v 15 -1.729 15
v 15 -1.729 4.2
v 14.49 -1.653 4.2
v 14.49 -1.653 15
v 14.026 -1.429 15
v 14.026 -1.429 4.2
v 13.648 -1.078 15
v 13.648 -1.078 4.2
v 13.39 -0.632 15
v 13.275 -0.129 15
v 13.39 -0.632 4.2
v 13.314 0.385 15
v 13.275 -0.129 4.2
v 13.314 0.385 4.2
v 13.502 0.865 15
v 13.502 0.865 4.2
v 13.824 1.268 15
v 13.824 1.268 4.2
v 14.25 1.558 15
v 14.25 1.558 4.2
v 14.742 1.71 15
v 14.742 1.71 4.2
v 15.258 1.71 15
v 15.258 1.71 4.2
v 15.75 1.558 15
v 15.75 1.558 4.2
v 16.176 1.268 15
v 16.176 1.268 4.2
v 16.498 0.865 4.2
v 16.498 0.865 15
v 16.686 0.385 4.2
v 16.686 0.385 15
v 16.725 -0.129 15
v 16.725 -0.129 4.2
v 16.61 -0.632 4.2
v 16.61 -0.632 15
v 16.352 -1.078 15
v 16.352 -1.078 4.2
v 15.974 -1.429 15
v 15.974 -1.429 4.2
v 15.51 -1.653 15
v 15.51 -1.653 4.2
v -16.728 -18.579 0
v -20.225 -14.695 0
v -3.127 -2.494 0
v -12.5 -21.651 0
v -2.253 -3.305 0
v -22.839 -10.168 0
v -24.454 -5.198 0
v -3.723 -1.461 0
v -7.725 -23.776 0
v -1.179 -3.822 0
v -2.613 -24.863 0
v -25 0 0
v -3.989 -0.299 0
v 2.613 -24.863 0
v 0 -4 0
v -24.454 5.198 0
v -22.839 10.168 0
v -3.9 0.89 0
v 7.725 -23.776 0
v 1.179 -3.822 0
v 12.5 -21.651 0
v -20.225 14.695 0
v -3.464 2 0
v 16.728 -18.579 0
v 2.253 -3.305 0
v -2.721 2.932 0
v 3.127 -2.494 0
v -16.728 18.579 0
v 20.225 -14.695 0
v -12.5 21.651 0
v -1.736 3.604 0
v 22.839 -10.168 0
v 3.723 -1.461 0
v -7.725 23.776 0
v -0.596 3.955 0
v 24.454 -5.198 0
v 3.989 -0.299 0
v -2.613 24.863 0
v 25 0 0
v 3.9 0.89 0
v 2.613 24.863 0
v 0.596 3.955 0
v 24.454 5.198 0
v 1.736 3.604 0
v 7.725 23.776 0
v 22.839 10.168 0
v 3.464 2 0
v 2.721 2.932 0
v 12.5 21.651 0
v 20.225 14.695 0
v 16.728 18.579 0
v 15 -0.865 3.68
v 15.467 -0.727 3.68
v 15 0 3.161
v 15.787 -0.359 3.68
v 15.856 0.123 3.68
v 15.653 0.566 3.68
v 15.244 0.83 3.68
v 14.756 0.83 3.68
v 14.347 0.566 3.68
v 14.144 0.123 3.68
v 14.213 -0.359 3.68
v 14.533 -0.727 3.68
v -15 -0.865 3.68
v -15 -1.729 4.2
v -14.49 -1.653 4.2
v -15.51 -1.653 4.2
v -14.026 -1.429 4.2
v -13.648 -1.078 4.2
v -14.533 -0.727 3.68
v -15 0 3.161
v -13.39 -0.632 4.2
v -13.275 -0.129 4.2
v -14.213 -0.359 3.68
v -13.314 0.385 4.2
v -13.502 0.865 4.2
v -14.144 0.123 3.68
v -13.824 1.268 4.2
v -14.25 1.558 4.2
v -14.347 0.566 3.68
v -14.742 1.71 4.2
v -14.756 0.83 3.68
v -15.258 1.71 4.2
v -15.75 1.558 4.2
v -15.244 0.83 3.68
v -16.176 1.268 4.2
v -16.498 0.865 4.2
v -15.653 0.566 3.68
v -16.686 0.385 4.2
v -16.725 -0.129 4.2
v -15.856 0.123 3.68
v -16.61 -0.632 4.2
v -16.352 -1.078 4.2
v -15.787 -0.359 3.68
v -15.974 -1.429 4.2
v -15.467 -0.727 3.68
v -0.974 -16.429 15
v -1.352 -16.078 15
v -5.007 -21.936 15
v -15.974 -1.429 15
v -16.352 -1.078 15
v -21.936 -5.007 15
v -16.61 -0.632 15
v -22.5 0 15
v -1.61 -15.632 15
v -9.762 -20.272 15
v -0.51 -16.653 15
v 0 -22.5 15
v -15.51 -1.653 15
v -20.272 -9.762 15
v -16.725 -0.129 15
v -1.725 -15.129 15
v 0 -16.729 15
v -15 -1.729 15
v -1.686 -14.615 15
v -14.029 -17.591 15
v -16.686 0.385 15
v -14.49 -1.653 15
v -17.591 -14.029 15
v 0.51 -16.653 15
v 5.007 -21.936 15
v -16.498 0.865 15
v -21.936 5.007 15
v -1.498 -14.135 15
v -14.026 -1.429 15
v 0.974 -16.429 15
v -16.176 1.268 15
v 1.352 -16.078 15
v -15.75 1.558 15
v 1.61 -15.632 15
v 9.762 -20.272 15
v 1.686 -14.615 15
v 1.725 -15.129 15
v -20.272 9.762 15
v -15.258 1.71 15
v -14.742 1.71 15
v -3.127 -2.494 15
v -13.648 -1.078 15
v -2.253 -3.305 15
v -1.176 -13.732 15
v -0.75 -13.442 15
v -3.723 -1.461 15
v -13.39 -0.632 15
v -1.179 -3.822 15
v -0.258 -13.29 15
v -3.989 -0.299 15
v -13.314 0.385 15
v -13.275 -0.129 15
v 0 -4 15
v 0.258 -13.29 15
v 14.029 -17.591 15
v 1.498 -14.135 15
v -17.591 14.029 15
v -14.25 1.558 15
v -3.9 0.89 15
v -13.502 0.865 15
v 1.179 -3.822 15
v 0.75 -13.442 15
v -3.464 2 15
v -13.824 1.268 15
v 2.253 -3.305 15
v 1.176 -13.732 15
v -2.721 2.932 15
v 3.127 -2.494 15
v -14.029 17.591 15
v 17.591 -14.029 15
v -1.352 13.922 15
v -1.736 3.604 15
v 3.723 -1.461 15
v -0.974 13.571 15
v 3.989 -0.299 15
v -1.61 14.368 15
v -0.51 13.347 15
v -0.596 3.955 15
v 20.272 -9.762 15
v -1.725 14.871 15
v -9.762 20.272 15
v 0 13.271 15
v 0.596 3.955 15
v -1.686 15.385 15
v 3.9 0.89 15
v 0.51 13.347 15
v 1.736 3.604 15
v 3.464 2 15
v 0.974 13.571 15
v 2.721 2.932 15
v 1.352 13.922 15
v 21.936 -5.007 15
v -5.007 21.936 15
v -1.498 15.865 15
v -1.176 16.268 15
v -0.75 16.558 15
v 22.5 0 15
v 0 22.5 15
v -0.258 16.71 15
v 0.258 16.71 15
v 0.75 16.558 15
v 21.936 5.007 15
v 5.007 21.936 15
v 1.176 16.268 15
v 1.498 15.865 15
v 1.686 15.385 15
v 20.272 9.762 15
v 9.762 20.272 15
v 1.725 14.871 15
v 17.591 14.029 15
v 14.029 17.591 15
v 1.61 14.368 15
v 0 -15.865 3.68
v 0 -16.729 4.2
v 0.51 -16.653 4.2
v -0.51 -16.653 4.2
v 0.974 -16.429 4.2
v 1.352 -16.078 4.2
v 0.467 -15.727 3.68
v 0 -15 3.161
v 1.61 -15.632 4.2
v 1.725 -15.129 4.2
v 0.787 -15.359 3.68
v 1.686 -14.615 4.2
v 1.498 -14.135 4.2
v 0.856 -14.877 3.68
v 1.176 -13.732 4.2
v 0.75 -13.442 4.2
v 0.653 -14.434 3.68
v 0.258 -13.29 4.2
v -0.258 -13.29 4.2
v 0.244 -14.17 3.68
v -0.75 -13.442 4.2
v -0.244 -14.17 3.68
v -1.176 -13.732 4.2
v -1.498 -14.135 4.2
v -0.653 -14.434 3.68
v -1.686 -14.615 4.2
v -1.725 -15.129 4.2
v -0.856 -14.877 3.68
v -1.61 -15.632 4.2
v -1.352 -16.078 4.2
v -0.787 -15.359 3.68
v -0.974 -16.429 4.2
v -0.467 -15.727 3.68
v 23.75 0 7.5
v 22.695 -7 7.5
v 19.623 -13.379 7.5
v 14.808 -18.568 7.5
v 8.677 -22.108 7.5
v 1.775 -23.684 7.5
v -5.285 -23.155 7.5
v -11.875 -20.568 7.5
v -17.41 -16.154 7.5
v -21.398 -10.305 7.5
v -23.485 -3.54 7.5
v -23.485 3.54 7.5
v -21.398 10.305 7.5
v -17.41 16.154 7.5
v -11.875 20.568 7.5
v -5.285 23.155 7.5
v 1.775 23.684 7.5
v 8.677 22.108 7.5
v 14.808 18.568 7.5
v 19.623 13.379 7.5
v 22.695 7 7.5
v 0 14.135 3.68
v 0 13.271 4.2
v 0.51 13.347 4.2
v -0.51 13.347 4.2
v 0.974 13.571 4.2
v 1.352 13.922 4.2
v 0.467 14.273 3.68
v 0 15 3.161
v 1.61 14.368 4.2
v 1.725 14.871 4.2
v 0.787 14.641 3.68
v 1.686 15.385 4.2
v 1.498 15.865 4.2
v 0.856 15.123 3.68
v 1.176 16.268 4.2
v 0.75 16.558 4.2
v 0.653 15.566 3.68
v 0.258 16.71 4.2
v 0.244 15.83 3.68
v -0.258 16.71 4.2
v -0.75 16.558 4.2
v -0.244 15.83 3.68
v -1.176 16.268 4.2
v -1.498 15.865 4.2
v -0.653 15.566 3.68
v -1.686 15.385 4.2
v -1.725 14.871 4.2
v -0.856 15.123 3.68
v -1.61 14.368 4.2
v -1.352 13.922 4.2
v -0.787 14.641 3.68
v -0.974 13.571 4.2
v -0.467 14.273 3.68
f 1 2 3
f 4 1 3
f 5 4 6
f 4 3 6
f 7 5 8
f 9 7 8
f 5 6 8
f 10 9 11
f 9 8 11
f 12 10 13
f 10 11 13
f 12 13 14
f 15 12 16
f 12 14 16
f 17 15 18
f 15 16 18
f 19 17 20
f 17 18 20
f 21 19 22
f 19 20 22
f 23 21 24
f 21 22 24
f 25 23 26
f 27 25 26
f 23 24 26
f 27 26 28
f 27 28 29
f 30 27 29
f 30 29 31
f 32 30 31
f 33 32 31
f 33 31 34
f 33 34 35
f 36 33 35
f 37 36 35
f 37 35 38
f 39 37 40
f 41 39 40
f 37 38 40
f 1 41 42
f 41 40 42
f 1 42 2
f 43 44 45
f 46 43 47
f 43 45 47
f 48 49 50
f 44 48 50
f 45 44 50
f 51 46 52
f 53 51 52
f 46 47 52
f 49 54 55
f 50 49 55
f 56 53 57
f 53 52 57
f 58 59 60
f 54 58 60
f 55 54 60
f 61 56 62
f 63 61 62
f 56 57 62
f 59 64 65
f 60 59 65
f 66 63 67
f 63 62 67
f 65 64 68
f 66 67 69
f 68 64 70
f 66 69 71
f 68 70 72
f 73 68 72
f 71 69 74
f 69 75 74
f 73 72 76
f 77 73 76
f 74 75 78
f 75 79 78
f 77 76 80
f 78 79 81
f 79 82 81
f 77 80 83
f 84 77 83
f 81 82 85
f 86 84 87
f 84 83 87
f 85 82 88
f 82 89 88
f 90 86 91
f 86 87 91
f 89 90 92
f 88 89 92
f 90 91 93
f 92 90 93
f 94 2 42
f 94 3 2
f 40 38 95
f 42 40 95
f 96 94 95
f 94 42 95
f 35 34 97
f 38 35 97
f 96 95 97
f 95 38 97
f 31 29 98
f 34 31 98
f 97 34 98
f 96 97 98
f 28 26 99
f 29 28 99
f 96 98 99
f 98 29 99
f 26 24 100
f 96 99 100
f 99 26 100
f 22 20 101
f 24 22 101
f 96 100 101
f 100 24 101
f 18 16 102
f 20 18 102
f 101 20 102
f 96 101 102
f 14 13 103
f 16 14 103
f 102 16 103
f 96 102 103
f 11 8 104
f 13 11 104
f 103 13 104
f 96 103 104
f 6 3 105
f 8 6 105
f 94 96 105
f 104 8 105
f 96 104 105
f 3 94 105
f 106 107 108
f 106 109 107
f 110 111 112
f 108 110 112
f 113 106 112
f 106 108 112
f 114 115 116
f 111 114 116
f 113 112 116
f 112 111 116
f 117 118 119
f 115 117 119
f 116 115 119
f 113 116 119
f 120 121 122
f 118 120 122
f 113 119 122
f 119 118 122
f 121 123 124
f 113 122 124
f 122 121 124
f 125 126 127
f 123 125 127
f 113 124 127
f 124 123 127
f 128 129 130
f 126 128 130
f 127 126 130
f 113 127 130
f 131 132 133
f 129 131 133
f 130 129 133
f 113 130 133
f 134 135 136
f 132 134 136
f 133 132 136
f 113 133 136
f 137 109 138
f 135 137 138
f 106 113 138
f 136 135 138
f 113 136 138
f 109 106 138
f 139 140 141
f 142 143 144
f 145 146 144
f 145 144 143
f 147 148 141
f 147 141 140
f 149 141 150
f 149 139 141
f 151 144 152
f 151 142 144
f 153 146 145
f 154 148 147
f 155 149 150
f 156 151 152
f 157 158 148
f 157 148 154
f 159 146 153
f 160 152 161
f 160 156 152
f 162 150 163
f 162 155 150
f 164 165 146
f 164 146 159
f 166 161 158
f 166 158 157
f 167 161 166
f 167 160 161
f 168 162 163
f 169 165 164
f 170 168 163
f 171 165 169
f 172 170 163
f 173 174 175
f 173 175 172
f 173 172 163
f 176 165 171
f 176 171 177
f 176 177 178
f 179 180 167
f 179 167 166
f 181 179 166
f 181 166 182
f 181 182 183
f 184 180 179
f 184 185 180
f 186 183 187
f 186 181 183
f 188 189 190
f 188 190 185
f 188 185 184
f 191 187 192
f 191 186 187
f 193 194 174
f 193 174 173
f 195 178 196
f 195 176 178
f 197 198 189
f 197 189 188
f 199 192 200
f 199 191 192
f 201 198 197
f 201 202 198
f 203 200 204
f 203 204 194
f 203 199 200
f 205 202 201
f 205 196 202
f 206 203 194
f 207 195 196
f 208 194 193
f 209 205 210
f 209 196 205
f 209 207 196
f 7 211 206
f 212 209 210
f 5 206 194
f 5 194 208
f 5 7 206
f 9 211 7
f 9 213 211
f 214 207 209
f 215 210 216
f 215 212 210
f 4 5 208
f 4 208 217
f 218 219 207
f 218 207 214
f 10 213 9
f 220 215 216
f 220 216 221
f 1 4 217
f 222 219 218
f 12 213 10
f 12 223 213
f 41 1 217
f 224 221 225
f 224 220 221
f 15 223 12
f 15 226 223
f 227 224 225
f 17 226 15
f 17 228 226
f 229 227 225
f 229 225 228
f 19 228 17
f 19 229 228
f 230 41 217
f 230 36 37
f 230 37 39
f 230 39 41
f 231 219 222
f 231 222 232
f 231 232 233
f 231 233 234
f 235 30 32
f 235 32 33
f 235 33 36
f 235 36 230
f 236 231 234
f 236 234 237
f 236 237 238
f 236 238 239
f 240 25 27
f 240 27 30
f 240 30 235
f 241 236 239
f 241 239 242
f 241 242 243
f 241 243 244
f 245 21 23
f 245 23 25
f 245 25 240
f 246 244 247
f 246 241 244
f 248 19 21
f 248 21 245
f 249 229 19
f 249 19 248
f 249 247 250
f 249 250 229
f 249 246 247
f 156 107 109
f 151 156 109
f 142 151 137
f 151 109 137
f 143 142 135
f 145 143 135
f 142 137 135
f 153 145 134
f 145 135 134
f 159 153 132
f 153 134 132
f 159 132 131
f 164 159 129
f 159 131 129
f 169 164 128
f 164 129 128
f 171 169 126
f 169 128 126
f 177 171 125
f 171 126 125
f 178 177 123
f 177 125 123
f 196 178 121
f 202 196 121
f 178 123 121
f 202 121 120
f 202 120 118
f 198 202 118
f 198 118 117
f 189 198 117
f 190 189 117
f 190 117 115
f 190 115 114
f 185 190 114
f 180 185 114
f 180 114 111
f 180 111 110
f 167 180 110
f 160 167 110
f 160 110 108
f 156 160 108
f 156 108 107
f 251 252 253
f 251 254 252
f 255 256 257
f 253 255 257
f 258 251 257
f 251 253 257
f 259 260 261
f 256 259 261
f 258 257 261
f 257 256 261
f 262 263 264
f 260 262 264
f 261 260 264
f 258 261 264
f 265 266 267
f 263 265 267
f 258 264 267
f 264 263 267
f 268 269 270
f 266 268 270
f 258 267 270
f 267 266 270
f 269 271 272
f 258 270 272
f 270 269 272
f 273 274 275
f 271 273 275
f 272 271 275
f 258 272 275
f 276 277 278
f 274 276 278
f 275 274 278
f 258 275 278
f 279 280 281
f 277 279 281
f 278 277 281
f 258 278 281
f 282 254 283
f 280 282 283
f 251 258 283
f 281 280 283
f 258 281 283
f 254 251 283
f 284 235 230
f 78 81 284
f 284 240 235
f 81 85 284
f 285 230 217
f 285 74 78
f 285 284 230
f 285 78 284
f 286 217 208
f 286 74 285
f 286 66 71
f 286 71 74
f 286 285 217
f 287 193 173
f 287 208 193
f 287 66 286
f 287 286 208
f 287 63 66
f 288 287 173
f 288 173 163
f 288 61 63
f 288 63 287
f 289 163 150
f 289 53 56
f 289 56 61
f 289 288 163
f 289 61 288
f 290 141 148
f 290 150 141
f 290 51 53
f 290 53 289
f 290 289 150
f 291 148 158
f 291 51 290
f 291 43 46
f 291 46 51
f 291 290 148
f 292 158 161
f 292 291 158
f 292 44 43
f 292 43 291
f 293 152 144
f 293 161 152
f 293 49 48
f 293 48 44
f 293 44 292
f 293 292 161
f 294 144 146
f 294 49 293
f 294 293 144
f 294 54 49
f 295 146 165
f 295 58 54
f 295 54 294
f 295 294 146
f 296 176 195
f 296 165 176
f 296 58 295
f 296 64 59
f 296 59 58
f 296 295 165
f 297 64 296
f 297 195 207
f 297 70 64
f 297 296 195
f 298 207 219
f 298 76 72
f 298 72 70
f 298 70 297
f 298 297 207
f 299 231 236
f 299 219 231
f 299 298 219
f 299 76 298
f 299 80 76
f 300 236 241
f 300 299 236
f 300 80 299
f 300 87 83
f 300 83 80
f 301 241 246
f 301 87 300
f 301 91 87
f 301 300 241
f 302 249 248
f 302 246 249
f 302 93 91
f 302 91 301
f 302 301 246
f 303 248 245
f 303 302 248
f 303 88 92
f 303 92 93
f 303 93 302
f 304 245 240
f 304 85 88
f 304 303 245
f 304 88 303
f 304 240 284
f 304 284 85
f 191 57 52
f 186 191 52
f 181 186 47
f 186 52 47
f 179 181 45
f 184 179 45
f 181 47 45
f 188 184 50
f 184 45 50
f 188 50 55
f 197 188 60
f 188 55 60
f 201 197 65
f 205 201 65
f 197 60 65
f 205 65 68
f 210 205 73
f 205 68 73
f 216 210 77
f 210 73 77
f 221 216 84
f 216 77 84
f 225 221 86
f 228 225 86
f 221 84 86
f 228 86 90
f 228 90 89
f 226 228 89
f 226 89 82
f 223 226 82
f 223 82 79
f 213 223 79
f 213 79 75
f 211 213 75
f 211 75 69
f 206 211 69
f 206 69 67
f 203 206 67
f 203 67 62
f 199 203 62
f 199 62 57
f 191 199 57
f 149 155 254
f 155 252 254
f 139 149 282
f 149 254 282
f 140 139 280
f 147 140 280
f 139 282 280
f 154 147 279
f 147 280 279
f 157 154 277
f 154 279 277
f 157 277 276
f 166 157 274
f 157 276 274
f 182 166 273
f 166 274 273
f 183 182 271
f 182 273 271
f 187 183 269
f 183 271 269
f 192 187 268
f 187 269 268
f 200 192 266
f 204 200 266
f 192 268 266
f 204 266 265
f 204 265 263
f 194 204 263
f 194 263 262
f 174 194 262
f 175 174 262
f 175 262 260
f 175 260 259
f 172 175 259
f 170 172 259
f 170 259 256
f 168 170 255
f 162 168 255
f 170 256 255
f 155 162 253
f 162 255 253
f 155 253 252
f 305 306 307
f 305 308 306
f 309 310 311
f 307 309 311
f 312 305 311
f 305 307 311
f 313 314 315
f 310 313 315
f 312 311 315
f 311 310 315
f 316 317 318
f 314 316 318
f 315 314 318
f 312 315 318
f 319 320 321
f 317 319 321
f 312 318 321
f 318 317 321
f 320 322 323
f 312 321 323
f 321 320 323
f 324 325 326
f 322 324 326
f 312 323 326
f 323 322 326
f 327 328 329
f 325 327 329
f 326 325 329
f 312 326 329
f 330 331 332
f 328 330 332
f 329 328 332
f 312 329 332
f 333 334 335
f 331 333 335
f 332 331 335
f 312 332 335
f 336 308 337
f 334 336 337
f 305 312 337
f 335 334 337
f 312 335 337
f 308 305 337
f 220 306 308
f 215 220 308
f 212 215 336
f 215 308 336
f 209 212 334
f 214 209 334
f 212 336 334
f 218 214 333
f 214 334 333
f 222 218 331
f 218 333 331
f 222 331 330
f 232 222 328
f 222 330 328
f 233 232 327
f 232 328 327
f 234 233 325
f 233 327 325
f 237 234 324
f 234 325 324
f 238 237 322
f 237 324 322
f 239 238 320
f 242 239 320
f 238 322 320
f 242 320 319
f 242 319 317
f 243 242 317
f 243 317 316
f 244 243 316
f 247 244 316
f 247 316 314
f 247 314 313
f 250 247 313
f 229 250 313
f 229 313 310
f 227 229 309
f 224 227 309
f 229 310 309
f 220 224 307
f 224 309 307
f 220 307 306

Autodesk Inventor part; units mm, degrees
ref_plane "YZ Plane" through (0, 0, 0) normal (1, 0, 0) x (0, 1, 0)
ref_plane "XZ Plane" through (0, 0, 0) normal (0, 1, 0) x (-1, 0, 0)
sketch "スケッチ7" plane through (0, 0, 0) normal (0, 0, 1) x (1, 0, 0)
  circle A0 centre (0, 0) radius 25
  dimension "d32" = 50
ref_plane "作業平面7" through (0, 0, 15) normal (0, 0, 1) x (1, 0, 0)
sketch "スケッチ8" plane through (0, 0, 15) normal (0, 0, 1) x (1, 0, 0)
  circle A0 centre (0, 0) radius 22.5
  dimension "d34" = 45
loft "ロフト2" add profiles "スケッチ7", "スケッチ8"
sketch "スケッチ5" plane through (0, 0, 15) normal (0, 0, 1) x (1, 0, 0)
  point P0 (0, 0)
  point P1 (0, 0)
hole "穴1" at (0, 0, 15) direction (0, 0, -1) diameter 8 end through all
sketch "スケッチ6" plane through (0, 0, 15) normal (0, 0, 1) x (1, 0, 0)
  point P0 (0, 0)
  point P1 (15, 0)
  point P2 (0, 15)
  point P3 (-15, 0)
  point P4 (0, -15)
  point P5 (0, 0)
  dimension "d21" = 360
  dimension "d23" = 30
hole "穴2" at (15, 0, 15) at (0, 15, 15) at (-15, 0, 15) at (0, -15, 15) direction (0, 0, -1) diameter 3.4587 depth 10.8 tip angle 118 thread size "M4x0.5" class "6H" standard "ISO Metric profile"
properties part number "Stator_N5065"
